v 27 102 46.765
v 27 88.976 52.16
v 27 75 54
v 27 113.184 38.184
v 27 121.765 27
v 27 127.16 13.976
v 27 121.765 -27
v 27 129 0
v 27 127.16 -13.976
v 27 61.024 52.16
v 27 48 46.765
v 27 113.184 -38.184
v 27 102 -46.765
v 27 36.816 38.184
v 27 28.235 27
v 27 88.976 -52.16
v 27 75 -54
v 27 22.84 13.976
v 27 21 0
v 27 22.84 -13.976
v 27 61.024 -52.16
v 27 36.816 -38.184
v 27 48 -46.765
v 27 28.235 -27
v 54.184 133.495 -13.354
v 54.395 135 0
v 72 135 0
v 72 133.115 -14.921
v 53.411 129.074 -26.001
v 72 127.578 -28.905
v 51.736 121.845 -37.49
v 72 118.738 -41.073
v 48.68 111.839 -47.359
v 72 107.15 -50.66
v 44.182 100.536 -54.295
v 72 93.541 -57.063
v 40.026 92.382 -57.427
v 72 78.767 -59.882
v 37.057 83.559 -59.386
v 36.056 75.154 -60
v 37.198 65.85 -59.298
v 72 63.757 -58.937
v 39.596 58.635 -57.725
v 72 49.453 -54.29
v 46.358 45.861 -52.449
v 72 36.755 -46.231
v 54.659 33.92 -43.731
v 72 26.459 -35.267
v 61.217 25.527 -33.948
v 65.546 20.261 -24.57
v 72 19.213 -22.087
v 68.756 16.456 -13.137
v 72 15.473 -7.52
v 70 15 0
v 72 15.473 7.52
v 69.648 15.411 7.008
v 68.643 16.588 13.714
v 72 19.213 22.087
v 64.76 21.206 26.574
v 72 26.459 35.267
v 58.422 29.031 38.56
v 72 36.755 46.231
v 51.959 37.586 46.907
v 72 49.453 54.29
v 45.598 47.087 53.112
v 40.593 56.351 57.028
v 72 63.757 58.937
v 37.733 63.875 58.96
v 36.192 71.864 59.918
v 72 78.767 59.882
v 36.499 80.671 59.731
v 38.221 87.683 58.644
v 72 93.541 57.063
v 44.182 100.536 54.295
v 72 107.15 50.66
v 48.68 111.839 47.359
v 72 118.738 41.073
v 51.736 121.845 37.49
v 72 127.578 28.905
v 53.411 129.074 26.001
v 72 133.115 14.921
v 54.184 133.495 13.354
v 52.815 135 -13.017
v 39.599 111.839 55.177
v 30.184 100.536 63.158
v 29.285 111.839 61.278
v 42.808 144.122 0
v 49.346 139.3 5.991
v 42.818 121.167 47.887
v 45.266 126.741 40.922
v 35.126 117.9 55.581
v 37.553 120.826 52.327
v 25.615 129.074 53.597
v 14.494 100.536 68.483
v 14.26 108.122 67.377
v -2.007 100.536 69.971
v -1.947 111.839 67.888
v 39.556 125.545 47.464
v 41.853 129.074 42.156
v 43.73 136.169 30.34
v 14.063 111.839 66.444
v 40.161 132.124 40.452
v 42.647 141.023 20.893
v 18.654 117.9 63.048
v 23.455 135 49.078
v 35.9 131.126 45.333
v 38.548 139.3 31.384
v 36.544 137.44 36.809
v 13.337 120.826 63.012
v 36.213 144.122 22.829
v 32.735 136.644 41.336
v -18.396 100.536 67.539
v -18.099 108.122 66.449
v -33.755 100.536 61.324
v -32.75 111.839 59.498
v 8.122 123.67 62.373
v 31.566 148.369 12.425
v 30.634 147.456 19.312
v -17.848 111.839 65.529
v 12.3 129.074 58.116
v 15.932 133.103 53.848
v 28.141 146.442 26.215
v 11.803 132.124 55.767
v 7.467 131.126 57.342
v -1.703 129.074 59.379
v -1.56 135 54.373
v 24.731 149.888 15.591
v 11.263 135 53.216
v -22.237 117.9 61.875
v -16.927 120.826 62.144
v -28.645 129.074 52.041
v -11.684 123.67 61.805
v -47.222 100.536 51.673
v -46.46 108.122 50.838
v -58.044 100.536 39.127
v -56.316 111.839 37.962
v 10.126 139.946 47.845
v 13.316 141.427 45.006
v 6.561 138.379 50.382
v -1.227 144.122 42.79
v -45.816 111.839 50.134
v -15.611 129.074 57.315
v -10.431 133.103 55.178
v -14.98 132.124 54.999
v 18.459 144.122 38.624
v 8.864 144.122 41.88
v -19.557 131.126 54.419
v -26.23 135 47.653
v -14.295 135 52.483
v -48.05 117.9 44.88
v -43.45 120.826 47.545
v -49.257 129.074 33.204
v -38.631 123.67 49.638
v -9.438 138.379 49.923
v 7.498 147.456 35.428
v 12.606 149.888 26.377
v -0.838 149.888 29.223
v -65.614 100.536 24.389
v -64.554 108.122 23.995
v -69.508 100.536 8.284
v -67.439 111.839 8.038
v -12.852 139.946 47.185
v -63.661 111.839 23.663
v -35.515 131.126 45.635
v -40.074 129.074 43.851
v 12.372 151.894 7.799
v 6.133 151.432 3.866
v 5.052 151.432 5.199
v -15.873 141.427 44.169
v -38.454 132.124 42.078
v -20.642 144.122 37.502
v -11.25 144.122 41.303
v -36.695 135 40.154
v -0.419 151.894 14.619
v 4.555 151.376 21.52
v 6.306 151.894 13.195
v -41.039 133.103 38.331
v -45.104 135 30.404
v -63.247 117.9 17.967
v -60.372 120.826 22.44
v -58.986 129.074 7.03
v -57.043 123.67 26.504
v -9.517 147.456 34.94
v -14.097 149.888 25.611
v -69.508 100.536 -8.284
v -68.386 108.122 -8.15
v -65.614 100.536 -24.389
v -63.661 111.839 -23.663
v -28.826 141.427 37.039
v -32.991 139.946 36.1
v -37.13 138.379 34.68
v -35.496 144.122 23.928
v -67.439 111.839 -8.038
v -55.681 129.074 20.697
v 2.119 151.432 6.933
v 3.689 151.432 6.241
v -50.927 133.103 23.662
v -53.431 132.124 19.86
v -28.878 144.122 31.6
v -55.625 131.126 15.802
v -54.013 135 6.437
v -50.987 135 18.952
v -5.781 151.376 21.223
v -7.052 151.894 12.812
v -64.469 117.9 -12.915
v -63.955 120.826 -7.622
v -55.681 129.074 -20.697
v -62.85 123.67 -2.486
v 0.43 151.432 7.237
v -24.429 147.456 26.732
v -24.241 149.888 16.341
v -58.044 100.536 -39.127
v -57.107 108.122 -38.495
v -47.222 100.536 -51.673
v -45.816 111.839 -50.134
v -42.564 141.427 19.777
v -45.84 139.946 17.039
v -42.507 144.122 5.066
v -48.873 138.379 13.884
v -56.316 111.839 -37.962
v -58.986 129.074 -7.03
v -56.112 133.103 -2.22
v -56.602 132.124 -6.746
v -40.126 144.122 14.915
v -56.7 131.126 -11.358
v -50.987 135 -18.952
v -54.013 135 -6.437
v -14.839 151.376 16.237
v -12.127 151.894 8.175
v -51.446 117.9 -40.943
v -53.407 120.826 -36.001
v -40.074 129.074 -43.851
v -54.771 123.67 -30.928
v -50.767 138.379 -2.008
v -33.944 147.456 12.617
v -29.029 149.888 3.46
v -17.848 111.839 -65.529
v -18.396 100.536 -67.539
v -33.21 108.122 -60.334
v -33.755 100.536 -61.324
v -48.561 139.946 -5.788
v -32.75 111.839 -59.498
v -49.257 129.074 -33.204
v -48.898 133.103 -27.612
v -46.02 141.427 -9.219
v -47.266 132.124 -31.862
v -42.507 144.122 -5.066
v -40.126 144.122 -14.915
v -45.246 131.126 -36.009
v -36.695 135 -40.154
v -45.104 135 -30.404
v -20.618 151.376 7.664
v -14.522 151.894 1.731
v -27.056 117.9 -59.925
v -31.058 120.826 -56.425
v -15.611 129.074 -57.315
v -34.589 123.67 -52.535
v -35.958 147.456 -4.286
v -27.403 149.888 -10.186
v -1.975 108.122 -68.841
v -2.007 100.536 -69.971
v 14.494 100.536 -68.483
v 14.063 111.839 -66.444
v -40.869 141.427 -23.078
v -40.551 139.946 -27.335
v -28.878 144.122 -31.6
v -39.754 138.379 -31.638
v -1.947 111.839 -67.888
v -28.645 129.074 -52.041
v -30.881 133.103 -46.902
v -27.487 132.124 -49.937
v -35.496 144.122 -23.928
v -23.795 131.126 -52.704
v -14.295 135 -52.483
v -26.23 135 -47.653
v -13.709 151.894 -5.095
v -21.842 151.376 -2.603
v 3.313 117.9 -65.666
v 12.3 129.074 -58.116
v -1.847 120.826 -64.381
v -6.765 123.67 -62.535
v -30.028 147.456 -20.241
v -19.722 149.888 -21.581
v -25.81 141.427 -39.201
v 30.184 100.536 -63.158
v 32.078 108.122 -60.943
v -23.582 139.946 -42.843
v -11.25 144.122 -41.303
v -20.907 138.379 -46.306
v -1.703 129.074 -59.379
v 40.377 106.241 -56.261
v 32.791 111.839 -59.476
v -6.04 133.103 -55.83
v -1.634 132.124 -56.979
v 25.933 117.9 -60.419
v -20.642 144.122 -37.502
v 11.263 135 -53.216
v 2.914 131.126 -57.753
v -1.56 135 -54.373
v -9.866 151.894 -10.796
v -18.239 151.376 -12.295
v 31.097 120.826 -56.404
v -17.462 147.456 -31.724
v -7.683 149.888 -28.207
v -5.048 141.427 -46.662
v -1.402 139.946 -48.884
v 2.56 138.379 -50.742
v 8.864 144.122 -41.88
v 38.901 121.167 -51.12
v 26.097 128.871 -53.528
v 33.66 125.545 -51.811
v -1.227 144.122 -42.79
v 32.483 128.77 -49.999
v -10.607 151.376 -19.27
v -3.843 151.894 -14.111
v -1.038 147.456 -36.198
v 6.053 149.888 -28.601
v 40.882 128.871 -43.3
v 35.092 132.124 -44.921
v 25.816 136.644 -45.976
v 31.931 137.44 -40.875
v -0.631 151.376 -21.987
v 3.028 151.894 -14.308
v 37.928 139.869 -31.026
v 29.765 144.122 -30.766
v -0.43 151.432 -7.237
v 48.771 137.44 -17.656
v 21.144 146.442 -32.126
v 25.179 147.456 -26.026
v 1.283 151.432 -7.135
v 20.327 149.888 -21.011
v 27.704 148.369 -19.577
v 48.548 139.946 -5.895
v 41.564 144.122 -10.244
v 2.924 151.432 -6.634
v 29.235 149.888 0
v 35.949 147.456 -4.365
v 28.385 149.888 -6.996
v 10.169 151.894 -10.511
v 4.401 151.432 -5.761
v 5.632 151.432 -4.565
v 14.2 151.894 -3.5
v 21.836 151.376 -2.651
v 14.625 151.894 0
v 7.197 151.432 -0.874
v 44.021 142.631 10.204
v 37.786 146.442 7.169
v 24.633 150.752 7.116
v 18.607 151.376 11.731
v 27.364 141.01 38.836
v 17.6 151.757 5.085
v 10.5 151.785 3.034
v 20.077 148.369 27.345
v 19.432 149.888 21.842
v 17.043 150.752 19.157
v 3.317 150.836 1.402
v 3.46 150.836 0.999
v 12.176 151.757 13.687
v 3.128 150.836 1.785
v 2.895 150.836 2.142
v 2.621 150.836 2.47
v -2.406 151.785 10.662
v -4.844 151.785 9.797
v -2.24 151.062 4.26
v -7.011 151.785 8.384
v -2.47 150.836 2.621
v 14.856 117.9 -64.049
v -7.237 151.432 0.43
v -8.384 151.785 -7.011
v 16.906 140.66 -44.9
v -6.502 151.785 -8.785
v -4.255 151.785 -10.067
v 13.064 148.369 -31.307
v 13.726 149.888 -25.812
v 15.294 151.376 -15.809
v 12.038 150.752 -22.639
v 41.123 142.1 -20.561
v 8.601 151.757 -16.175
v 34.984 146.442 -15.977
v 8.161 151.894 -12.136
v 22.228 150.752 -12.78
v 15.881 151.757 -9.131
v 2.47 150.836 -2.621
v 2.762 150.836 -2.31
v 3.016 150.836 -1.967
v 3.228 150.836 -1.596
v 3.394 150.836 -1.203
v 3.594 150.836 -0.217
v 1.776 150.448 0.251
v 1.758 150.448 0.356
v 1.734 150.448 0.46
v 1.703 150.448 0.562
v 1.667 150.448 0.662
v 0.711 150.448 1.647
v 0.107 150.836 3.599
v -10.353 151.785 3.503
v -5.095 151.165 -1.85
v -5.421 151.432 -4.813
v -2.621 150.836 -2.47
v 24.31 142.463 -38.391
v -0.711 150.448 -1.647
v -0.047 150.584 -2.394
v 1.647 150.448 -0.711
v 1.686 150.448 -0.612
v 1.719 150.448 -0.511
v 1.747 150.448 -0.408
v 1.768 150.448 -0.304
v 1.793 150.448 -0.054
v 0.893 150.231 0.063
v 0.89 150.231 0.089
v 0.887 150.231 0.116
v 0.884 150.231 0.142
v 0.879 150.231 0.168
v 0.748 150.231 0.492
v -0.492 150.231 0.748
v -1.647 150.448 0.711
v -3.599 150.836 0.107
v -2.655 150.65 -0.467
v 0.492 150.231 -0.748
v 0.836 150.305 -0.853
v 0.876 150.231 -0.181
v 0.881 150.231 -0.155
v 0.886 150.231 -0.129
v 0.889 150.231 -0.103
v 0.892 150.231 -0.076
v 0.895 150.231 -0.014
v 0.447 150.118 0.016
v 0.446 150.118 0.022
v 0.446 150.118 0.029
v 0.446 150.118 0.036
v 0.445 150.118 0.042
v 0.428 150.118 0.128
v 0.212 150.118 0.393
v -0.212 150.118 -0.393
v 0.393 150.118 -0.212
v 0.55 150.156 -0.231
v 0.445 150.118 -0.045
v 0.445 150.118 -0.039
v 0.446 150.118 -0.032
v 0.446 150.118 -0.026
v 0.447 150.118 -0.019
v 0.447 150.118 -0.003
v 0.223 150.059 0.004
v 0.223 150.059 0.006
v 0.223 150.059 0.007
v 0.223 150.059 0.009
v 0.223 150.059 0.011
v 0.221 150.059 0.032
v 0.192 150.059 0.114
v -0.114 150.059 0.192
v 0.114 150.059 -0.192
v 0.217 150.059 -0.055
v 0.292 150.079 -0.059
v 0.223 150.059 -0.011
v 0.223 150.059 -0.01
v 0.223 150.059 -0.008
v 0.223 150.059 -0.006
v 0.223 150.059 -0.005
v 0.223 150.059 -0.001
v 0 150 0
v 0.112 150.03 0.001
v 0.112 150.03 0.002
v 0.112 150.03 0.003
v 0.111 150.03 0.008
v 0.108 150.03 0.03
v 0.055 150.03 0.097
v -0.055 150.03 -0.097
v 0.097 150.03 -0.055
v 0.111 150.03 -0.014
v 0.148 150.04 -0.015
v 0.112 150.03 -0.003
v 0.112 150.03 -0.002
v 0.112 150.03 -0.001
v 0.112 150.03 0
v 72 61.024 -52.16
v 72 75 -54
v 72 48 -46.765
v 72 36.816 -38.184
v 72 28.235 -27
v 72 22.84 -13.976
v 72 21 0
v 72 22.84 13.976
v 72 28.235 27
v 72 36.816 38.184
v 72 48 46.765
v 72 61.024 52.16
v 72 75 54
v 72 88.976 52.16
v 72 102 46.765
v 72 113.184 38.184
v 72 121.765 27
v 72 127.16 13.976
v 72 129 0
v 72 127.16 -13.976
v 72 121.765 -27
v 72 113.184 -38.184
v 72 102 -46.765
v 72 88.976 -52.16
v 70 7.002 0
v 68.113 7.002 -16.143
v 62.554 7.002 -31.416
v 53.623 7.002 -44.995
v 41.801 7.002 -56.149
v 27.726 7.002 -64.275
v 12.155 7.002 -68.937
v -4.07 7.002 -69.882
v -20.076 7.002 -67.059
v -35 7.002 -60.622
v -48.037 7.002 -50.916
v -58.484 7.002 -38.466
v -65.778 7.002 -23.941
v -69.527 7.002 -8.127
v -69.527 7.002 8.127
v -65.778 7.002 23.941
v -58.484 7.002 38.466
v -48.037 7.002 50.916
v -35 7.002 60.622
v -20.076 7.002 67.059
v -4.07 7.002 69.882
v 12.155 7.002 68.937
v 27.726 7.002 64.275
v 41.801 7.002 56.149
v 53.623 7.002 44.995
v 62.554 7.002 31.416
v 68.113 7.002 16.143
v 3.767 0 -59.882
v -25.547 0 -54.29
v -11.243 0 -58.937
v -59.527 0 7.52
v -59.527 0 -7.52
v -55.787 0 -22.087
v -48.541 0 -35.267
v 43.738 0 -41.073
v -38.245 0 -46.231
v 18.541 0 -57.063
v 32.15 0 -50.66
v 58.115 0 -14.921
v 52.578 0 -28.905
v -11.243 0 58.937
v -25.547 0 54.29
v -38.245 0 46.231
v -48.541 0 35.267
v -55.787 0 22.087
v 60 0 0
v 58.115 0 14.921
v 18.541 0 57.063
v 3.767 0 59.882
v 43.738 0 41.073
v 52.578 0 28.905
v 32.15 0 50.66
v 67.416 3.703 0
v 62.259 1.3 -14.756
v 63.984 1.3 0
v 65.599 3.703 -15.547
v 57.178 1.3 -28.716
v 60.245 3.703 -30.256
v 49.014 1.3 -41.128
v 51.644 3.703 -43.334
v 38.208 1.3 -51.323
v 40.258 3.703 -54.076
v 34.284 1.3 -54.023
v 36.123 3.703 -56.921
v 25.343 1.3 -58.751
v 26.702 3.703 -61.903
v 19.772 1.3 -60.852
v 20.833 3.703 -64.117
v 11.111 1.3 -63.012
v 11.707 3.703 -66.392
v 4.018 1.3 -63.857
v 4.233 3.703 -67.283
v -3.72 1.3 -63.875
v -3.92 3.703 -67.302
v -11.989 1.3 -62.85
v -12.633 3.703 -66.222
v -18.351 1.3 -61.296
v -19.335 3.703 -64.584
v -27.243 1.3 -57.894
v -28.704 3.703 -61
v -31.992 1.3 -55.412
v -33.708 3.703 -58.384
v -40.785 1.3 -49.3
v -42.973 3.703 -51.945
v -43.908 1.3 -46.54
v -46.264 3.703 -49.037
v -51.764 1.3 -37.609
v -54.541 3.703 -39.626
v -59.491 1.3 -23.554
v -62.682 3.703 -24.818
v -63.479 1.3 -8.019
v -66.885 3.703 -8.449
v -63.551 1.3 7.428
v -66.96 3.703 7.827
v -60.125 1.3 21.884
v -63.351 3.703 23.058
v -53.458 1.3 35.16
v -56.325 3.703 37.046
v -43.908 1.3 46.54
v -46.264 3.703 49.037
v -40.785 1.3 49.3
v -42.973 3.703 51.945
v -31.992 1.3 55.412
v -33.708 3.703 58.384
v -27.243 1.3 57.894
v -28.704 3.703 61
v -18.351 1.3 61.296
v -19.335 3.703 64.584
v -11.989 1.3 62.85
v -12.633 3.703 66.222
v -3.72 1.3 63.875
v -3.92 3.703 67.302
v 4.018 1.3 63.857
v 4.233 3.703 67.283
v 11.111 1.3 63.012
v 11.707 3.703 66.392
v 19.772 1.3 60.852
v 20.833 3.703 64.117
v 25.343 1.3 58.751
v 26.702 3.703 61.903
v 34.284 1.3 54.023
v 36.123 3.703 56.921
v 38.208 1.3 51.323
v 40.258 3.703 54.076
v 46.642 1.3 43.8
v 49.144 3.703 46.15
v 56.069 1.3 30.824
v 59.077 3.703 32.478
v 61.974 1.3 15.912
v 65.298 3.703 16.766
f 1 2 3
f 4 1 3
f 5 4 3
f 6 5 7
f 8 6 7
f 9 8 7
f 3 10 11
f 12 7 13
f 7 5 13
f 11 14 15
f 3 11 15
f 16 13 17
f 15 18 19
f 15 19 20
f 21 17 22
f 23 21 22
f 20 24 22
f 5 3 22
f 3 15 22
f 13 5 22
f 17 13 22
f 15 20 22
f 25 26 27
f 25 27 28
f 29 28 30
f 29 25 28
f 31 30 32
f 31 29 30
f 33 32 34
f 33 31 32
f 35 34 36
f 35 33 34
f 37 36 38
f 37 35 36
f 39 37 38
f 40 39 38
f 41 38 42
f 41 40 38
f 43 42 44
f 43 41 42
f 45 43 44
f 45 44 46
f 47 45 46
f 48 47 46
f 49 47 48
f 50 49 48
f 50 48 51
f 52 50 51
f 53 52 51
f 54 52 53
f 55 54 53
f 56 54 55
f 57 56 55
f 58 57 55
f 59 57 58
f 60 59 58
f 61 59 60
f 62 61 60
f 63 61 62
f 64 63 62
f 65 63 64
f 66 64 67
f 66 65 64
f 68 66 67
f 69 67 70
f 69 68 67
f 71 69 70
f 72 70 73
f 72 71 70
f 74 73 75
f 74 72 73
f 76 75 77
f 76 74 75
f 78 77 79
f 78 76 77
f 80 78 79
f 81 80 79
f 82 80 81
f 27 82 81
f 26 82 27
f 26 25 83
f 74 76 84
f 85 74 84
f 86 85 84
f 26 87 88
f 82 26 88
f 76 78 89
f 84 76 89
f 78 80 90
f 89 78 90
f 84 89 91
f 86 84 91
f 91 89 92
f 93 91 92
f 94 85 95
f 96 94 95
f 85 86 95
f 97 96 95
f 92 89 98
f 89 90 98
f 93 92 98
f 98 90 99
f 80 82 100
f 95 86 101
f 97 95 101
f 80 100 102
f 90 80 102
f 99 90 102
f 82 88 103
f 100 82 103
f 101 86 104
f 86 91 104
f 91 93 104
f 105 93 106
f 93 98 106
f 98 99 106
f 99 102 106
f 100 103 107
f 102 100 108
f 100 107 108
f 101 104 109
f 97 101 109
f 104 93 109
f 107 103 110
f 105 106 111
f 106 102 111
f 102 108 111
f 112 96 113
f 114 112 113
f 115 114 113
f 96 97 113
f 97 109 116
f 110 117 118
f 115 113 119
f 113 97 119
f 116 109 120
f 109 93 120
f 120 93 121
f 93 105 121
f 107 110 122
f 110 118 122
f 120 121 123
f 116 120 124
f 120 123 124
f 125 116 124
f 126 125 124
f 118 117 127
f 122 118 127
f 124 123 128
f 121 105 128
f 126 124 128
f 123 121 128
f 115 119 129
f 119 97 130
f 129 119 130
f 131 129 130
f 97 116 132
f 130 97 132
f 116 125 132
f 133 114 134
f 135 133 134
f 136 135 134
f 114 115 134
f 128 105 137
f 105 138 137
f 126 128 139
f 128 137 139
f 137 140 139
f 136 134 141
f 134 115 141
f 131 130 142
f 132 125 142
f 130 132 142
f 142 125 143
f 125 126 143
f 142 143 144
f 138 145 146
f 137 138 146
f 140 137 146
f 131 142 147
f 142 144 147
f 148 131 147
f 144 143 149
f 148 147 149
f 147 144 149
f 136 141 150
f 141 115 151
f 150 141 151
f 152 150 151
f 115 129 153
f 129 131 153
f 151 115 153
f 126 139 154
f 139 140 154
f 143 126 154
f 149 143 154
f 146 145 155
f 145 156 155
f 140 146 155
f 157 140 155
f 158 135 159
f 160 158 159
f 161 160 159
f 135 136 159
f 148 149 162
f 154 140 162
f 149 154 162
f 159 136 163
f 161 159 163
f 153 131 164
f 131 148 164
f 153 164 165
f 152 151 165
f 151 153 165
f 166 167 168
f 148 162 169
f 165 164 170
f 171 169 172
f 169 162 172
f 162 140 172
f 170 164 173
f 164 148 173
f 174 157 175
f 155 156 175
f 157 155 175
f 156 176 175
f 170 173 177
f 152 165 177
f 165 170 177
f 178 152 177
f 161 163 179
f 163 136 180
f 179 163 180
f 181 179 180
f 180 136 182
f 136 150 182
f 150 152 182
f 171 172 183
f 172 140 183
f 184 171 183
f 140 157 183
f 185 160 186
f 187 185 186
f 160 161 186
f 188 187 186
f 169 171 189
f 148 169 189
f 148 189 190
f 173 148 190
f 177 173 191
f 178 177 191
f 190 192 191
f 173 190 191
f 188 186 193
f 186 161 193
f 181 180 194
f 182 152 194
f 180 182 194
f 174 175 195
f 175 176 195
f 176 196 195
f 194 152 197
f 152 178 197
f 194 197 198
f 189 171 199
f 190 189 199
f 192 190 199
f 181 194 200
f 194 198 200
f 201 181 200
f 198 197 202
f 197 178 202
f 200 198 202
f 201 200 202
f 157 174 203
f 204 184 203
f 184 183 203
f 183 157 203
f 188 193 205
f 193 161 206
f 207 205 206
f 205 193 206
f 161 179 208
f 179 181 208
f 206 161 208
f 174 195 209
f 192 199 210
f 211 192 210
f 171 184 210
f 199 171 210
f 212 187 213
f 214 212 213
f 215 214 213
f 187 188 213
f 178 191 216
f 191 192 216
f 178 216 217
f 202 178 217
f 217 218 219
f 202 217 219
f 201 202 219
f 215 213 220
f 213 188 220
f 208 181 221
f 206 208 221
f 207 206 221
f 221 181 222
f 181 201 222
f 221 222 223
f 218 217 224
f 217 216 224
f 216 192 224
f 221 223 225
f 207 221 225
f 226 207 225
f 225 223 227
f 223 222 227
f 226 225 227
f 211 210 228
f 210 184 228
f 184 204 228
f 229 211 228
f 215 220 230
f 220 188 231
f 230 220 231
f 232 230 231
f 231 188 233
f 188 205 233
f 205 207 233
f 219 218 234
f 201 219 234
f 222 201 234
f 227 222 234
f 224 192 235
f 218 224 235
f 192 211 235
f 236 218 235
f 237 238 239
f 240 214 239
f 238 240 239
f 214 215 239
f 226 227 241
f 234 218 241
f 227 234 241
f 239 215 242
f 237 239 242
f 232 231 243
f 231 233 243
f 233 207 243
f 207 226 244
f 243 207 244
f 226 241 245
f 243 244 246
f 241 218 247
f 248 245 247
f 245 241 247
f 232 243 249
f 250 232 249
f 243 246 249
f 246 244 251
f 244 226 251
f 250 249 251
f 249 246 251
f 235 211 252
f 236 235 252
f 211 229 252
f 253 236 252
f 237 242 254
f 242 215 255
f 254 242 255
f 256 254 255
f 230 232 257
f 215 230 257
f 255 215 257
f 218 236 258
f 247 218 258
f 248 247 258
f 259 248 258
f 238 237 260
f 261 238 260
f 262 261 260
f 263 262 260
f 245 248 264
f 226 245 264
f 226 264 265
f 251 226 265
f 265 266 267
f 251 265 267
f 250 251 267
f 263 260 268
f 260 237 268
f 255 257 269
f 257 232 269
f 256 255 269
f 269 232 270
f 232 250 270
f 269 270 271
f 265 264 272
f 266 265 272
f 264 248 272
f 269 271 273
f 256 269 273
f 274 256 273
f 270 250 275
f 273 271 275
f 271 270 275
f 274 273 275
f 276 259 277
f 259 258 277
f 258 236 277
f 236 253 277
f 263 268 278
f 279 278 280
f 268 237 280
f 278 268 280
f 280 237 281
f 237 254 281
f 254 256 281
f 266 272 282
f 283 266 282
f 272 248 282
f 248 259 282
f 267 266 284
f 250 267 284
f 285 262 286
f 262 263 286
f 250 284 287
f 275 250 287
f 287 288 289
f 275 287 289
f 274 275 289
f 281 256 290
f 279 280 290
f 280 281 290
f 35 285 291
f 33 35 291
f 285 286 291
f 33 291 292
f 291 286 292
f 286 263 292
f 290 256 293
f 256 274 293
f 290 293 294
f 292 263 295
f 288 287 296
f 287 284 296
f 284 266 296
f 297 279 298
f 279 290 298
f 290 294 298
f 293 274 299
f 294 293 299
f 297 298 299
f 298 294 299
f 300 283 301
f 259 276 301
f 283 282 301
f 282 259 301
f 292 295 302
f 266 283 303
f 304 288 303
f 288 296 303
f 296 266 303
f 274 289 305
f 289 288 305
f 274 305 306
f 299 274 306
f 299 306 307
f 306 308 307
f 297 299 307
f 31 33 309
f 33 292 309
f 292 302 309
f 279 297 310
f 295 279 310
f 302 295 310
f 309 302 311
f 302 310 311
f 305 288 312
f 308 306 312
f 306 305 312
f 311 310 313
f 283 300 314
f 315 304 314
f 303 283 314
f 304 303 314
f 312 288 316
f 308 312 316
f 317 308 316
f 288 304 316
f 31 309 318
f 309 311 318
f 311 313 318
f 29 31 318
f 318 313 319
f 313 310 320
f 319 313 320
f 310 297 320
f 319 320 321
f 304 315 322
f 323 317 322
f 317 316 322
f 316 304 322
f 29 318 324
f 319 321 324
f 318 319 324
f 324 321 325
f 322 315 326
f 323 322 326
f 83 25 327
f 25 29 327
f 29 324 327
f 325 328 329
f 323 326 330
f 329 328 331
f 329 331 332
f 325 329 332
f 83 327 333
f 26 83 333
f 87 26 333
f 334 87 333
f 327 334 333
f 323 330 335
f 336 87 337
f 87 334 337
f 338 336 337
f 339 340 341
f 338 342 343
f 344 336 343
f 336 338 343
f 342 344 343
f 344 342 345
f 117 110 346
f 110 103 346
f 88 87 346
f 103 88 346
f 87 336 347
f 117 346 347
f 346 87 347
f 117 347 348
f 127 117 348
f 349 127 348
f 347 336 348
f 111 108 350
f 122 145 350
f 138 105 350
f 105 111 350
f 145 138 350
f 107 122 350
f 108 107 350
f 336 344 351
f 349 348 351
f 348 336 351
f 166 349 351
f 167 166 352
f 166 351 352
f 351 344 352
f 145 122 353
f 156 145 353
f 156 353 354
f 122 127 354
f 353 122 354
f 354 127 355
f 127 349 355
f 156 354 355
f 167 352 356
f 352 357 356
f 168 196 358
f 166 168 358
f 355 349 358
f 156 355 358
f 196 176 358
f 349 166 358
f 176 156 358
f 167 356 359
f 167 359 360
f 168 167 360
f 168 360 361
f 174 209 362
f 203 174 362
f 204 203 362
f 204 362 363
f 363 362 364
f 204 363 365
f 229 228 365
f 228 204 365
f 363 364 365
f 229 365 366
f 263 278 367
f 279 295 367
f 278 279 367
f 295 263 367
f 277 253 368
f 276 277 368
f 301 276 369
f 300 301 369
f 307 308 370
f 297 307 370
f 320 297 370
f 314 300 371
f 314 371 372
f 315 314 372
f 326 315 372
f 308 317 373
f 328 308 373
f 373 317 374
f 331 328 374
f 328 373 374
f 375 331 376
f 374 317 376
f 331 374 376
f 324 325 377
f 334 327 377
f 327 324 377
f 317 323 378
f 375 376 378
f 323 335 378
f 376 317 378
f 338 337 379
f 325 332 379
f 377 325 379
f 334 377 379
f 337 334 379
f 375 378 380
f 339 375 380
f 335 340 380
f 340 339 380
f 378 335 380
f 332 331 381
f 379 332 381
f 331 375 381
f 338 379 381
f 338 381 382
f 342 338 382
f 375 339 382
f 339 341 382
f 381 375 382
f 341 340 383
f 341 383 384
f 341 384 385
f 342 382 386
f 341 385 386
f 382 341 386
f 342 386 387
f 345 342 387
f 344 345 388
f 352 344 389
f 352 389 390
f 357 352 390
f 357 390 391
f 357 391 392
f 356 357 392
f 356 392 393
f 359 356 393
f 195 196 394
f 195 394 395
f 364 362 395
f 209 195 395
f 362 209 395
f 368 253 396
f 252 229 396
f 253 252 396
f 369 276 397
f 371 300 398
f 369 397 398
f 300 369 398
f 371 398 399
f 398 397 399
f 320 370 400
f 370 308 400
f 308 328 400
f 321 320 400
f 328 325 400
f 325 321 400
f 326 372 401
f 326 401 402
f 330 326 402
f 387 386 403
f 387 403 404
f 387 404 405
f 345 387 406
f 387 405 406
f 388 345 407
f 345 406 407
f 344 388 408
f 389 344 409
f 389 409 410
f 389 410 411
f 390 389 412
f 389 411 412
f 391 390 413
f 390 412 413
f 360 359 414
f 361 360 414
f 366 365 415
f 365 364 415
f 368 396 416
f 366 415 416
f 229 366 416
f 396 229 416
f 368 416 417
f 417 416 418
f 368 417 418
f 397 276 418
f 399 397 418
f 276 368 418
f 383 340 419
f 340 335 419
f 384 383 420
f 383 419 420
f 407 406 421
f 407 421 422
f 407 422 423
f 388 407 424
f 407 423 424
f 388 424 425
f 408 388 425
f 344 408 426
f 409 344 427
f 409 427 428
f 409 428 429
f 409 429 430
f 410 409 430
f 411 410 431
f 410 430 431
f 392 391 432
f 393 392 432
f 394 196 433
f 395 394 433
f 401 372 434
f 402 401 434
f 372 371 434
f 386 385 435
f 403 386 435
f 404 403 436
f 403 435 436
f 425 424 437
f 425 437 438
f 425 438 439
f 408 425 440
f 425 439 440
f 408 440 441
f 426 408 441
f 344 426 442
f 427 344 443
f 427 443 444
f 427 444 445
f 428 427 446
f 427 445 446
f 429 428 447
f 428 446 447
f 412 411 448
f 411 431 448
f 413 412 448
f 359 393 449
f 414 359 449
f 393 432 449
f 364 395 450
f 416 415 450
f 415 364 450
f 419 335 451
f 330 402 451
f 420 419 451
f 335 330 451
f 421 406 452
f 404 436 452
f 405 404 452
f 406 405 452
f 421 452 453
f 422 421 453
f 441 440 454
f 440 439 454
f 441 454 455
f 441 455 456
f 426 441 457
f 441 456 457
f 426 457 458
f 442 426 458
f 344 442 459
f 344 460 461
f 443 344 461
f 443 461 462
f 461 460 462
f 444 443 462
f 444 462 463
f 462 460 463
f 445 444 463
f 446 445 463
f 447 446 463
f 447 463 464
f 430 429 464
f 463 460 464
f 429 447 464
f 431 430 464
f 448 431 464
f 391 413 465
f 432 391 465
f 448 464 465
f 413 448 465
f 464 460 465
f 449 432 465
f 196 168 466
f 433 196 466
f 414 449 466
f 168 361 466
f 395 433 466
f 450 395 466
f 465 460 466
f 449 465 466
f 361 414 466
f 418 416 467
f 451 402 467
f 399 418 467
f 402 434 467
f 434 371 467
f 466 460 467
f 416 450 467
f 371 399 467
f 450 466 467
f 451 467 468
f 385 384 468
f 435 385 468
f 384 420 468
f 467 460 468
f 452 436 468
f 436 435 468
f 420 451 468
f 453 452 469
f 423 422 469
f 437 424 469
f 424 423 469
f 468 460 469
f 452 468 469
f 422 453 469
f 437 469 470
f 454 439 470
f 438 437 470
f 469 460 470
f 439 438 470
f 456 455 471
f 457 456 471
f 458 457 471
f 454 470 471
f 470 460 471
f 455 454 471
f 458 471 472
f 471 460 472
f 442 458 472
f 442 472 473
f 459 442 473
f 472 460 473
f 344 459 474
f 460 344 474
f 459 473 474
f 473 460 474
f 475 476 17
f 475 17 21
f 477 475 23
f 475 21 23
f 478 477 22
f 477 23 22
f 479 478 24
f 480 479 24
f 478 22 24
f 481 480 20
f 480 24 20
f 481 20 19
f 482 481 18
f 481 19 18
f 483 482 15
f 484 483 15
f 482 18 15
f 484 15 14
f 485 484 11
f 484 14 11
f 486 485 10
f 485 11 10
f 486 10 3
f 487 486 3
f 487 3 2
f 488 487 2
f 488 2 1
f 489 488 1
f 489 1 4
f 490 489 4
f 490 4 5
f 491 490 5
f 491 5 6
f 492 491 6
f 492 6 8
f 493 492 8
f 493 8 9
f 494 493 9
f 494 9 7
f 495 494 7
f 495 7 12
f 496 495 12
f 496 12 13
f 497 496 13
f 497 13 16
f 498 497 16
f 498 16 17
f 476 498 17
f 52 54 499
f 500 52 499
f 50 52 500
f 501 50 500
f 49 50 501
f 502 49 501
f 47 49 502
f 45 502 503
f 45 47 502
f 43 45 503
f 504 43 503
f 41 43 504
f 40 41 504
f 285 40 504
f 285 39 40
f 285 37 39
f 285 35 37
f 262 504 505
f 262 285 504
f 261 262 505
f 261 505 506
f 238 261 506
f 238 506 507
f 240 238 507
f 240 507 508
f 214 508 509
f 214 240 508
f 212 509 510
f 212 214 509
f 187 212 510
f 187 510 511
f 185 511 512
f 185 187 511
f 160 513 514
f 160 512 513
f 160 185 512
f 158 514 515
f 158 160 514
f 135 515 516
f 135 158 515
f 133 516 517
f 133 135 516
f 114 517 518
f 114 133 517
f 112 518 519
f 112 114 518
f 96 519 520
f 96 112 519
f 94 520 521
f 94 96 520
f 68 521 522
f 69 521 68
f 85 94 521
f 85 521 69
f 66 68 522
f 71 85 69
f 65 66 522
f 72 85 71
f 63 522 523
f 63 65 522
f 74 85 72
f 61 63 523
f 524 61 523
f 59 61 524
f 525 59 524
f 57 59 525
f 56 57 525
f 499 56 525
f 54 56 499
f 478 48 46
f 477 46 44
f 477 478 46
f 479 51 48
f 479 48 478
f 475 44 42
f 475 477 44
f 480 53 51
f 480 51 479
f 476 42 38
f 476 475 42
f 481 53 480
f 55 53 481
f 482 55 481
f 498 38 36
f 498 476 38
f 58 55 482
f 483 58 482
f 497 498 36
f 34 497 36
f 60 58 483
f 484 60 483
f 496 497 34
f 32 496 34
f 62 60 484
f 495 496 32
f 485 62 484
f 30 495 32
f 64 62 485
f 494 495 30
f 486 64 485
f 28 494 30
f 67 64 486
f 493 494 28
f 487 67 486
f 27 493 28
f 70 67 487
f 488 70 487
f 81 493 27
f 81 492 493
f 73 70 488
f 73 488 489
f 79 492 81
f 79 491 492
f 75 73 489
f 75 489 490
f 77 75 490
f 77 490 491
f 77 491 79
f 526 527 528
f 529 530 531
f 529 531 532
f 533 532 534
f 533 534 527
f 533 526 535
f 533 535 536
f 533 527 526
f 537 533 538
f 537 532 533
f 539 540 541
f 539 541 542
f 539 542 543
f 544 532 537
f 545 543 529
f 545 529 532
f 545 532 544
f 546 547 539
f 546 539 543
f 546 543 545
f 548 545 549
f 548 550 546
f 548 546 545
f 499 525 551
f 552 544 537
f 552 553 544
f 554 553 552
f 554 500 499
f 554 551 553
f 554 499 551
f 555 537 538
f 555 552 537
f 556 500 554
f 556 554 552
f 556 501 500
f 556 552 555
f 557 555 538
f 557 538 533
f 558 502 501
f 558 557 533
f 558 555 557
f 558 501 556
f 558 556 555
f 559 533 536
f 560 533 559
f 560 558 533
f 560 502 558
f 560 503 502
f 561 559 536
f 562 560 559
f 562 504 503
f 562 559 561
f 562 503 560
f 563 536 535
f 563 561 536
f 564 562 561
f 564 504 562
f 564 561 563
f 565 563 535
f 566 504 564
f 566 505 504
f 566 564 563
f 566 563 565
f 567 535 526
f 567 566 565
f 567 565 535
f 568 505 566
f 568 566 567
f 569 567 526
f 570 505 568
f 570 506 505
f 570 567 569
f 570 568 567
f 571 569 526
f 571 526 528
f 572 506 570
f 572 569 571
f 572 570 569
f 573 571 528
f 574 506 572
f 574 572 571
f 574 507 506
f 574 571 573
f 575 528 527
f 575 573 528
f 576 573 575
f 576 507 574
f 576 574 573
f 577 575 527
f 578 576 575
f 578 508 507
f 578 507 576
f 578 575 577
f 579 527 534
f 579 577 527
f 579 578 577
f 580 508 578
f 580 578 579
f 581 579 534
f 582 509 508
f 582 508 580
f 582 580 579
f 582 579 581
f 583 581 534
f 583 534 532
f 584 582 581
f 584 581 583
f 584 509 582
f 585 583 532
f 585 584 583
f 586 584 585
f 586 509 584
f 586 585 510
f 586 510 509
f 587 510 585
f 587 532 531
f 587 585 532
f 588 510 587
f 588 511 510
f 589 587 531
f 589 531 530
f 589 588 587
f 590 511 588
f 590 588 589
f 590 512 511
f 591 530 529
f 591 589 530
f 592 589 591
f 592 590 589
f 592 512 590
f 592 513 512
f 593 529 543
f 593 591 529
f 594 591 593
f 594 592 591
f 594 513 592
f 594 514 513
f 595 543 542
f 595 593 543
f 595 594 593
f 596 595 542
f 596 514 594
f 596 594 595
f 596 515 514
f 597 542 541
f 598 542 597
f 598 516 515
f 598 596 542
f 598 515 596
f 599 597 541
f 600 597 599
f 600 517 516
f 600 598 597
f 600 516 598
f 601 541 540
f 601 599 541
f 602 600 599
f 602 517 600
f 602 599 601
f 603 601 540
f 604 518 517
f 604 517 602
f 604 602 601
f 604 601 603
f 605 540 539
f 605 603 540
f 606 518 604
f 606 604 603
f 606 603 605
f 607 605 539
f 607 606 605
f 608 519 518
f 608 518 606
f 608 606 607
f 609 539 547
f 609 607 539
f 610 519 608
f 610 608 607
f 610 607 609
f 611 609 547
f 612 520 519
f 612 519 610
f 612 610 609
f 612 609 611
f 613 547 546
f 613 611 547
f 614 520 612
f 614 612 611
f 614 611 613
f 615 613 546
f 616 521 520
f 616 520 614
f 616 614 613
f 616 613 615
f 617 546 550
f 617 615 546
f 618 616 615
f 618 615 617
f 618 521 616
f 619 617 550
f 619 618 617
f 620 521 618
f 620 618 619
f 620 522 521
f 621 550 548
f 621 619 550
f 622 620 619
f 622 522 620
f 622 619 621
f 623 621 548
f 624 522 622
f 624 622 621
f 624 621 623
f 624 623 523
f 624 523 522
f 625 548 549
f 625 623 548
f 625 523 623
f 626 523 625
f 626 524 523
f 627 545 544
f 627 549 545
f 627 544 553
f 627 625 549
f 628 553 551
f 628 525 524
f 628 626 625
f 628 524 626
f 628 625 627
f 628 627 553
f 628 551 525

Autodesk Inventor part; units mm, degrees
ref_plane "YZ Plane" through (0, 0, 0) normal (1, 0, 0) x (0, 1, 0)
ref_plane "XZ Plane" through (0, 0, 0) normal (0, 1, 0) x (-1, 0, 0)
ref_plane "XY Plane" through (0, 0, 0) normal (0, 0, 1) x (1, 0, 0)
sketch "Sketch1" plane through (0, 0, 0) normal (0, 0, 1) x (1, 0, 0)
  line L0 (0, 0) -> (60, 0)
  line L1 (0, 126.1861) -> (0, 150)
  line L2 (0, 18.2402) -> (0, 0)
  line L3 (0, 126.1861) -> (0, 18.2402)
  line L4 (70, 7.0021) -> (70, 100.5361)
  arc A0 (70, 100.5361) -> (0, 150) centre (14.4108, 96.1307) ccw
  arc A1 (60, 0) -> (70, 7.0021) centre (57.6261, 14.0321) ccw
  point P0 (84.7515, 38.5438)
  dimension "d1" = 60
  dimension "d2" = 150
  dimension "d22" = 10
revolve "Revolution1" add sketch "Sketch1" angle 360 about axis through (0, 126.1861, 0) along (0, -1, 0)
sketch "Sketch2" plane through (0, 0, 0) normal (1, 0, 0) x (0, 1, 0)
  line L0 (0, 75) -> (0, -75) projected
  circle A0 centre (75, 0) radius 60
  point P0 (0, 0)
  point P1 (150, 0)
  dimension "d4" = 120
  dimension "d25" = 75
extrude "Extrusion1" add sketch "Sketch2" along normal blind 72
hole "Hole1" at (72, 75, 0) direction (-1, 0, 0) diameter 108 depth 45
properties part number "tete"
